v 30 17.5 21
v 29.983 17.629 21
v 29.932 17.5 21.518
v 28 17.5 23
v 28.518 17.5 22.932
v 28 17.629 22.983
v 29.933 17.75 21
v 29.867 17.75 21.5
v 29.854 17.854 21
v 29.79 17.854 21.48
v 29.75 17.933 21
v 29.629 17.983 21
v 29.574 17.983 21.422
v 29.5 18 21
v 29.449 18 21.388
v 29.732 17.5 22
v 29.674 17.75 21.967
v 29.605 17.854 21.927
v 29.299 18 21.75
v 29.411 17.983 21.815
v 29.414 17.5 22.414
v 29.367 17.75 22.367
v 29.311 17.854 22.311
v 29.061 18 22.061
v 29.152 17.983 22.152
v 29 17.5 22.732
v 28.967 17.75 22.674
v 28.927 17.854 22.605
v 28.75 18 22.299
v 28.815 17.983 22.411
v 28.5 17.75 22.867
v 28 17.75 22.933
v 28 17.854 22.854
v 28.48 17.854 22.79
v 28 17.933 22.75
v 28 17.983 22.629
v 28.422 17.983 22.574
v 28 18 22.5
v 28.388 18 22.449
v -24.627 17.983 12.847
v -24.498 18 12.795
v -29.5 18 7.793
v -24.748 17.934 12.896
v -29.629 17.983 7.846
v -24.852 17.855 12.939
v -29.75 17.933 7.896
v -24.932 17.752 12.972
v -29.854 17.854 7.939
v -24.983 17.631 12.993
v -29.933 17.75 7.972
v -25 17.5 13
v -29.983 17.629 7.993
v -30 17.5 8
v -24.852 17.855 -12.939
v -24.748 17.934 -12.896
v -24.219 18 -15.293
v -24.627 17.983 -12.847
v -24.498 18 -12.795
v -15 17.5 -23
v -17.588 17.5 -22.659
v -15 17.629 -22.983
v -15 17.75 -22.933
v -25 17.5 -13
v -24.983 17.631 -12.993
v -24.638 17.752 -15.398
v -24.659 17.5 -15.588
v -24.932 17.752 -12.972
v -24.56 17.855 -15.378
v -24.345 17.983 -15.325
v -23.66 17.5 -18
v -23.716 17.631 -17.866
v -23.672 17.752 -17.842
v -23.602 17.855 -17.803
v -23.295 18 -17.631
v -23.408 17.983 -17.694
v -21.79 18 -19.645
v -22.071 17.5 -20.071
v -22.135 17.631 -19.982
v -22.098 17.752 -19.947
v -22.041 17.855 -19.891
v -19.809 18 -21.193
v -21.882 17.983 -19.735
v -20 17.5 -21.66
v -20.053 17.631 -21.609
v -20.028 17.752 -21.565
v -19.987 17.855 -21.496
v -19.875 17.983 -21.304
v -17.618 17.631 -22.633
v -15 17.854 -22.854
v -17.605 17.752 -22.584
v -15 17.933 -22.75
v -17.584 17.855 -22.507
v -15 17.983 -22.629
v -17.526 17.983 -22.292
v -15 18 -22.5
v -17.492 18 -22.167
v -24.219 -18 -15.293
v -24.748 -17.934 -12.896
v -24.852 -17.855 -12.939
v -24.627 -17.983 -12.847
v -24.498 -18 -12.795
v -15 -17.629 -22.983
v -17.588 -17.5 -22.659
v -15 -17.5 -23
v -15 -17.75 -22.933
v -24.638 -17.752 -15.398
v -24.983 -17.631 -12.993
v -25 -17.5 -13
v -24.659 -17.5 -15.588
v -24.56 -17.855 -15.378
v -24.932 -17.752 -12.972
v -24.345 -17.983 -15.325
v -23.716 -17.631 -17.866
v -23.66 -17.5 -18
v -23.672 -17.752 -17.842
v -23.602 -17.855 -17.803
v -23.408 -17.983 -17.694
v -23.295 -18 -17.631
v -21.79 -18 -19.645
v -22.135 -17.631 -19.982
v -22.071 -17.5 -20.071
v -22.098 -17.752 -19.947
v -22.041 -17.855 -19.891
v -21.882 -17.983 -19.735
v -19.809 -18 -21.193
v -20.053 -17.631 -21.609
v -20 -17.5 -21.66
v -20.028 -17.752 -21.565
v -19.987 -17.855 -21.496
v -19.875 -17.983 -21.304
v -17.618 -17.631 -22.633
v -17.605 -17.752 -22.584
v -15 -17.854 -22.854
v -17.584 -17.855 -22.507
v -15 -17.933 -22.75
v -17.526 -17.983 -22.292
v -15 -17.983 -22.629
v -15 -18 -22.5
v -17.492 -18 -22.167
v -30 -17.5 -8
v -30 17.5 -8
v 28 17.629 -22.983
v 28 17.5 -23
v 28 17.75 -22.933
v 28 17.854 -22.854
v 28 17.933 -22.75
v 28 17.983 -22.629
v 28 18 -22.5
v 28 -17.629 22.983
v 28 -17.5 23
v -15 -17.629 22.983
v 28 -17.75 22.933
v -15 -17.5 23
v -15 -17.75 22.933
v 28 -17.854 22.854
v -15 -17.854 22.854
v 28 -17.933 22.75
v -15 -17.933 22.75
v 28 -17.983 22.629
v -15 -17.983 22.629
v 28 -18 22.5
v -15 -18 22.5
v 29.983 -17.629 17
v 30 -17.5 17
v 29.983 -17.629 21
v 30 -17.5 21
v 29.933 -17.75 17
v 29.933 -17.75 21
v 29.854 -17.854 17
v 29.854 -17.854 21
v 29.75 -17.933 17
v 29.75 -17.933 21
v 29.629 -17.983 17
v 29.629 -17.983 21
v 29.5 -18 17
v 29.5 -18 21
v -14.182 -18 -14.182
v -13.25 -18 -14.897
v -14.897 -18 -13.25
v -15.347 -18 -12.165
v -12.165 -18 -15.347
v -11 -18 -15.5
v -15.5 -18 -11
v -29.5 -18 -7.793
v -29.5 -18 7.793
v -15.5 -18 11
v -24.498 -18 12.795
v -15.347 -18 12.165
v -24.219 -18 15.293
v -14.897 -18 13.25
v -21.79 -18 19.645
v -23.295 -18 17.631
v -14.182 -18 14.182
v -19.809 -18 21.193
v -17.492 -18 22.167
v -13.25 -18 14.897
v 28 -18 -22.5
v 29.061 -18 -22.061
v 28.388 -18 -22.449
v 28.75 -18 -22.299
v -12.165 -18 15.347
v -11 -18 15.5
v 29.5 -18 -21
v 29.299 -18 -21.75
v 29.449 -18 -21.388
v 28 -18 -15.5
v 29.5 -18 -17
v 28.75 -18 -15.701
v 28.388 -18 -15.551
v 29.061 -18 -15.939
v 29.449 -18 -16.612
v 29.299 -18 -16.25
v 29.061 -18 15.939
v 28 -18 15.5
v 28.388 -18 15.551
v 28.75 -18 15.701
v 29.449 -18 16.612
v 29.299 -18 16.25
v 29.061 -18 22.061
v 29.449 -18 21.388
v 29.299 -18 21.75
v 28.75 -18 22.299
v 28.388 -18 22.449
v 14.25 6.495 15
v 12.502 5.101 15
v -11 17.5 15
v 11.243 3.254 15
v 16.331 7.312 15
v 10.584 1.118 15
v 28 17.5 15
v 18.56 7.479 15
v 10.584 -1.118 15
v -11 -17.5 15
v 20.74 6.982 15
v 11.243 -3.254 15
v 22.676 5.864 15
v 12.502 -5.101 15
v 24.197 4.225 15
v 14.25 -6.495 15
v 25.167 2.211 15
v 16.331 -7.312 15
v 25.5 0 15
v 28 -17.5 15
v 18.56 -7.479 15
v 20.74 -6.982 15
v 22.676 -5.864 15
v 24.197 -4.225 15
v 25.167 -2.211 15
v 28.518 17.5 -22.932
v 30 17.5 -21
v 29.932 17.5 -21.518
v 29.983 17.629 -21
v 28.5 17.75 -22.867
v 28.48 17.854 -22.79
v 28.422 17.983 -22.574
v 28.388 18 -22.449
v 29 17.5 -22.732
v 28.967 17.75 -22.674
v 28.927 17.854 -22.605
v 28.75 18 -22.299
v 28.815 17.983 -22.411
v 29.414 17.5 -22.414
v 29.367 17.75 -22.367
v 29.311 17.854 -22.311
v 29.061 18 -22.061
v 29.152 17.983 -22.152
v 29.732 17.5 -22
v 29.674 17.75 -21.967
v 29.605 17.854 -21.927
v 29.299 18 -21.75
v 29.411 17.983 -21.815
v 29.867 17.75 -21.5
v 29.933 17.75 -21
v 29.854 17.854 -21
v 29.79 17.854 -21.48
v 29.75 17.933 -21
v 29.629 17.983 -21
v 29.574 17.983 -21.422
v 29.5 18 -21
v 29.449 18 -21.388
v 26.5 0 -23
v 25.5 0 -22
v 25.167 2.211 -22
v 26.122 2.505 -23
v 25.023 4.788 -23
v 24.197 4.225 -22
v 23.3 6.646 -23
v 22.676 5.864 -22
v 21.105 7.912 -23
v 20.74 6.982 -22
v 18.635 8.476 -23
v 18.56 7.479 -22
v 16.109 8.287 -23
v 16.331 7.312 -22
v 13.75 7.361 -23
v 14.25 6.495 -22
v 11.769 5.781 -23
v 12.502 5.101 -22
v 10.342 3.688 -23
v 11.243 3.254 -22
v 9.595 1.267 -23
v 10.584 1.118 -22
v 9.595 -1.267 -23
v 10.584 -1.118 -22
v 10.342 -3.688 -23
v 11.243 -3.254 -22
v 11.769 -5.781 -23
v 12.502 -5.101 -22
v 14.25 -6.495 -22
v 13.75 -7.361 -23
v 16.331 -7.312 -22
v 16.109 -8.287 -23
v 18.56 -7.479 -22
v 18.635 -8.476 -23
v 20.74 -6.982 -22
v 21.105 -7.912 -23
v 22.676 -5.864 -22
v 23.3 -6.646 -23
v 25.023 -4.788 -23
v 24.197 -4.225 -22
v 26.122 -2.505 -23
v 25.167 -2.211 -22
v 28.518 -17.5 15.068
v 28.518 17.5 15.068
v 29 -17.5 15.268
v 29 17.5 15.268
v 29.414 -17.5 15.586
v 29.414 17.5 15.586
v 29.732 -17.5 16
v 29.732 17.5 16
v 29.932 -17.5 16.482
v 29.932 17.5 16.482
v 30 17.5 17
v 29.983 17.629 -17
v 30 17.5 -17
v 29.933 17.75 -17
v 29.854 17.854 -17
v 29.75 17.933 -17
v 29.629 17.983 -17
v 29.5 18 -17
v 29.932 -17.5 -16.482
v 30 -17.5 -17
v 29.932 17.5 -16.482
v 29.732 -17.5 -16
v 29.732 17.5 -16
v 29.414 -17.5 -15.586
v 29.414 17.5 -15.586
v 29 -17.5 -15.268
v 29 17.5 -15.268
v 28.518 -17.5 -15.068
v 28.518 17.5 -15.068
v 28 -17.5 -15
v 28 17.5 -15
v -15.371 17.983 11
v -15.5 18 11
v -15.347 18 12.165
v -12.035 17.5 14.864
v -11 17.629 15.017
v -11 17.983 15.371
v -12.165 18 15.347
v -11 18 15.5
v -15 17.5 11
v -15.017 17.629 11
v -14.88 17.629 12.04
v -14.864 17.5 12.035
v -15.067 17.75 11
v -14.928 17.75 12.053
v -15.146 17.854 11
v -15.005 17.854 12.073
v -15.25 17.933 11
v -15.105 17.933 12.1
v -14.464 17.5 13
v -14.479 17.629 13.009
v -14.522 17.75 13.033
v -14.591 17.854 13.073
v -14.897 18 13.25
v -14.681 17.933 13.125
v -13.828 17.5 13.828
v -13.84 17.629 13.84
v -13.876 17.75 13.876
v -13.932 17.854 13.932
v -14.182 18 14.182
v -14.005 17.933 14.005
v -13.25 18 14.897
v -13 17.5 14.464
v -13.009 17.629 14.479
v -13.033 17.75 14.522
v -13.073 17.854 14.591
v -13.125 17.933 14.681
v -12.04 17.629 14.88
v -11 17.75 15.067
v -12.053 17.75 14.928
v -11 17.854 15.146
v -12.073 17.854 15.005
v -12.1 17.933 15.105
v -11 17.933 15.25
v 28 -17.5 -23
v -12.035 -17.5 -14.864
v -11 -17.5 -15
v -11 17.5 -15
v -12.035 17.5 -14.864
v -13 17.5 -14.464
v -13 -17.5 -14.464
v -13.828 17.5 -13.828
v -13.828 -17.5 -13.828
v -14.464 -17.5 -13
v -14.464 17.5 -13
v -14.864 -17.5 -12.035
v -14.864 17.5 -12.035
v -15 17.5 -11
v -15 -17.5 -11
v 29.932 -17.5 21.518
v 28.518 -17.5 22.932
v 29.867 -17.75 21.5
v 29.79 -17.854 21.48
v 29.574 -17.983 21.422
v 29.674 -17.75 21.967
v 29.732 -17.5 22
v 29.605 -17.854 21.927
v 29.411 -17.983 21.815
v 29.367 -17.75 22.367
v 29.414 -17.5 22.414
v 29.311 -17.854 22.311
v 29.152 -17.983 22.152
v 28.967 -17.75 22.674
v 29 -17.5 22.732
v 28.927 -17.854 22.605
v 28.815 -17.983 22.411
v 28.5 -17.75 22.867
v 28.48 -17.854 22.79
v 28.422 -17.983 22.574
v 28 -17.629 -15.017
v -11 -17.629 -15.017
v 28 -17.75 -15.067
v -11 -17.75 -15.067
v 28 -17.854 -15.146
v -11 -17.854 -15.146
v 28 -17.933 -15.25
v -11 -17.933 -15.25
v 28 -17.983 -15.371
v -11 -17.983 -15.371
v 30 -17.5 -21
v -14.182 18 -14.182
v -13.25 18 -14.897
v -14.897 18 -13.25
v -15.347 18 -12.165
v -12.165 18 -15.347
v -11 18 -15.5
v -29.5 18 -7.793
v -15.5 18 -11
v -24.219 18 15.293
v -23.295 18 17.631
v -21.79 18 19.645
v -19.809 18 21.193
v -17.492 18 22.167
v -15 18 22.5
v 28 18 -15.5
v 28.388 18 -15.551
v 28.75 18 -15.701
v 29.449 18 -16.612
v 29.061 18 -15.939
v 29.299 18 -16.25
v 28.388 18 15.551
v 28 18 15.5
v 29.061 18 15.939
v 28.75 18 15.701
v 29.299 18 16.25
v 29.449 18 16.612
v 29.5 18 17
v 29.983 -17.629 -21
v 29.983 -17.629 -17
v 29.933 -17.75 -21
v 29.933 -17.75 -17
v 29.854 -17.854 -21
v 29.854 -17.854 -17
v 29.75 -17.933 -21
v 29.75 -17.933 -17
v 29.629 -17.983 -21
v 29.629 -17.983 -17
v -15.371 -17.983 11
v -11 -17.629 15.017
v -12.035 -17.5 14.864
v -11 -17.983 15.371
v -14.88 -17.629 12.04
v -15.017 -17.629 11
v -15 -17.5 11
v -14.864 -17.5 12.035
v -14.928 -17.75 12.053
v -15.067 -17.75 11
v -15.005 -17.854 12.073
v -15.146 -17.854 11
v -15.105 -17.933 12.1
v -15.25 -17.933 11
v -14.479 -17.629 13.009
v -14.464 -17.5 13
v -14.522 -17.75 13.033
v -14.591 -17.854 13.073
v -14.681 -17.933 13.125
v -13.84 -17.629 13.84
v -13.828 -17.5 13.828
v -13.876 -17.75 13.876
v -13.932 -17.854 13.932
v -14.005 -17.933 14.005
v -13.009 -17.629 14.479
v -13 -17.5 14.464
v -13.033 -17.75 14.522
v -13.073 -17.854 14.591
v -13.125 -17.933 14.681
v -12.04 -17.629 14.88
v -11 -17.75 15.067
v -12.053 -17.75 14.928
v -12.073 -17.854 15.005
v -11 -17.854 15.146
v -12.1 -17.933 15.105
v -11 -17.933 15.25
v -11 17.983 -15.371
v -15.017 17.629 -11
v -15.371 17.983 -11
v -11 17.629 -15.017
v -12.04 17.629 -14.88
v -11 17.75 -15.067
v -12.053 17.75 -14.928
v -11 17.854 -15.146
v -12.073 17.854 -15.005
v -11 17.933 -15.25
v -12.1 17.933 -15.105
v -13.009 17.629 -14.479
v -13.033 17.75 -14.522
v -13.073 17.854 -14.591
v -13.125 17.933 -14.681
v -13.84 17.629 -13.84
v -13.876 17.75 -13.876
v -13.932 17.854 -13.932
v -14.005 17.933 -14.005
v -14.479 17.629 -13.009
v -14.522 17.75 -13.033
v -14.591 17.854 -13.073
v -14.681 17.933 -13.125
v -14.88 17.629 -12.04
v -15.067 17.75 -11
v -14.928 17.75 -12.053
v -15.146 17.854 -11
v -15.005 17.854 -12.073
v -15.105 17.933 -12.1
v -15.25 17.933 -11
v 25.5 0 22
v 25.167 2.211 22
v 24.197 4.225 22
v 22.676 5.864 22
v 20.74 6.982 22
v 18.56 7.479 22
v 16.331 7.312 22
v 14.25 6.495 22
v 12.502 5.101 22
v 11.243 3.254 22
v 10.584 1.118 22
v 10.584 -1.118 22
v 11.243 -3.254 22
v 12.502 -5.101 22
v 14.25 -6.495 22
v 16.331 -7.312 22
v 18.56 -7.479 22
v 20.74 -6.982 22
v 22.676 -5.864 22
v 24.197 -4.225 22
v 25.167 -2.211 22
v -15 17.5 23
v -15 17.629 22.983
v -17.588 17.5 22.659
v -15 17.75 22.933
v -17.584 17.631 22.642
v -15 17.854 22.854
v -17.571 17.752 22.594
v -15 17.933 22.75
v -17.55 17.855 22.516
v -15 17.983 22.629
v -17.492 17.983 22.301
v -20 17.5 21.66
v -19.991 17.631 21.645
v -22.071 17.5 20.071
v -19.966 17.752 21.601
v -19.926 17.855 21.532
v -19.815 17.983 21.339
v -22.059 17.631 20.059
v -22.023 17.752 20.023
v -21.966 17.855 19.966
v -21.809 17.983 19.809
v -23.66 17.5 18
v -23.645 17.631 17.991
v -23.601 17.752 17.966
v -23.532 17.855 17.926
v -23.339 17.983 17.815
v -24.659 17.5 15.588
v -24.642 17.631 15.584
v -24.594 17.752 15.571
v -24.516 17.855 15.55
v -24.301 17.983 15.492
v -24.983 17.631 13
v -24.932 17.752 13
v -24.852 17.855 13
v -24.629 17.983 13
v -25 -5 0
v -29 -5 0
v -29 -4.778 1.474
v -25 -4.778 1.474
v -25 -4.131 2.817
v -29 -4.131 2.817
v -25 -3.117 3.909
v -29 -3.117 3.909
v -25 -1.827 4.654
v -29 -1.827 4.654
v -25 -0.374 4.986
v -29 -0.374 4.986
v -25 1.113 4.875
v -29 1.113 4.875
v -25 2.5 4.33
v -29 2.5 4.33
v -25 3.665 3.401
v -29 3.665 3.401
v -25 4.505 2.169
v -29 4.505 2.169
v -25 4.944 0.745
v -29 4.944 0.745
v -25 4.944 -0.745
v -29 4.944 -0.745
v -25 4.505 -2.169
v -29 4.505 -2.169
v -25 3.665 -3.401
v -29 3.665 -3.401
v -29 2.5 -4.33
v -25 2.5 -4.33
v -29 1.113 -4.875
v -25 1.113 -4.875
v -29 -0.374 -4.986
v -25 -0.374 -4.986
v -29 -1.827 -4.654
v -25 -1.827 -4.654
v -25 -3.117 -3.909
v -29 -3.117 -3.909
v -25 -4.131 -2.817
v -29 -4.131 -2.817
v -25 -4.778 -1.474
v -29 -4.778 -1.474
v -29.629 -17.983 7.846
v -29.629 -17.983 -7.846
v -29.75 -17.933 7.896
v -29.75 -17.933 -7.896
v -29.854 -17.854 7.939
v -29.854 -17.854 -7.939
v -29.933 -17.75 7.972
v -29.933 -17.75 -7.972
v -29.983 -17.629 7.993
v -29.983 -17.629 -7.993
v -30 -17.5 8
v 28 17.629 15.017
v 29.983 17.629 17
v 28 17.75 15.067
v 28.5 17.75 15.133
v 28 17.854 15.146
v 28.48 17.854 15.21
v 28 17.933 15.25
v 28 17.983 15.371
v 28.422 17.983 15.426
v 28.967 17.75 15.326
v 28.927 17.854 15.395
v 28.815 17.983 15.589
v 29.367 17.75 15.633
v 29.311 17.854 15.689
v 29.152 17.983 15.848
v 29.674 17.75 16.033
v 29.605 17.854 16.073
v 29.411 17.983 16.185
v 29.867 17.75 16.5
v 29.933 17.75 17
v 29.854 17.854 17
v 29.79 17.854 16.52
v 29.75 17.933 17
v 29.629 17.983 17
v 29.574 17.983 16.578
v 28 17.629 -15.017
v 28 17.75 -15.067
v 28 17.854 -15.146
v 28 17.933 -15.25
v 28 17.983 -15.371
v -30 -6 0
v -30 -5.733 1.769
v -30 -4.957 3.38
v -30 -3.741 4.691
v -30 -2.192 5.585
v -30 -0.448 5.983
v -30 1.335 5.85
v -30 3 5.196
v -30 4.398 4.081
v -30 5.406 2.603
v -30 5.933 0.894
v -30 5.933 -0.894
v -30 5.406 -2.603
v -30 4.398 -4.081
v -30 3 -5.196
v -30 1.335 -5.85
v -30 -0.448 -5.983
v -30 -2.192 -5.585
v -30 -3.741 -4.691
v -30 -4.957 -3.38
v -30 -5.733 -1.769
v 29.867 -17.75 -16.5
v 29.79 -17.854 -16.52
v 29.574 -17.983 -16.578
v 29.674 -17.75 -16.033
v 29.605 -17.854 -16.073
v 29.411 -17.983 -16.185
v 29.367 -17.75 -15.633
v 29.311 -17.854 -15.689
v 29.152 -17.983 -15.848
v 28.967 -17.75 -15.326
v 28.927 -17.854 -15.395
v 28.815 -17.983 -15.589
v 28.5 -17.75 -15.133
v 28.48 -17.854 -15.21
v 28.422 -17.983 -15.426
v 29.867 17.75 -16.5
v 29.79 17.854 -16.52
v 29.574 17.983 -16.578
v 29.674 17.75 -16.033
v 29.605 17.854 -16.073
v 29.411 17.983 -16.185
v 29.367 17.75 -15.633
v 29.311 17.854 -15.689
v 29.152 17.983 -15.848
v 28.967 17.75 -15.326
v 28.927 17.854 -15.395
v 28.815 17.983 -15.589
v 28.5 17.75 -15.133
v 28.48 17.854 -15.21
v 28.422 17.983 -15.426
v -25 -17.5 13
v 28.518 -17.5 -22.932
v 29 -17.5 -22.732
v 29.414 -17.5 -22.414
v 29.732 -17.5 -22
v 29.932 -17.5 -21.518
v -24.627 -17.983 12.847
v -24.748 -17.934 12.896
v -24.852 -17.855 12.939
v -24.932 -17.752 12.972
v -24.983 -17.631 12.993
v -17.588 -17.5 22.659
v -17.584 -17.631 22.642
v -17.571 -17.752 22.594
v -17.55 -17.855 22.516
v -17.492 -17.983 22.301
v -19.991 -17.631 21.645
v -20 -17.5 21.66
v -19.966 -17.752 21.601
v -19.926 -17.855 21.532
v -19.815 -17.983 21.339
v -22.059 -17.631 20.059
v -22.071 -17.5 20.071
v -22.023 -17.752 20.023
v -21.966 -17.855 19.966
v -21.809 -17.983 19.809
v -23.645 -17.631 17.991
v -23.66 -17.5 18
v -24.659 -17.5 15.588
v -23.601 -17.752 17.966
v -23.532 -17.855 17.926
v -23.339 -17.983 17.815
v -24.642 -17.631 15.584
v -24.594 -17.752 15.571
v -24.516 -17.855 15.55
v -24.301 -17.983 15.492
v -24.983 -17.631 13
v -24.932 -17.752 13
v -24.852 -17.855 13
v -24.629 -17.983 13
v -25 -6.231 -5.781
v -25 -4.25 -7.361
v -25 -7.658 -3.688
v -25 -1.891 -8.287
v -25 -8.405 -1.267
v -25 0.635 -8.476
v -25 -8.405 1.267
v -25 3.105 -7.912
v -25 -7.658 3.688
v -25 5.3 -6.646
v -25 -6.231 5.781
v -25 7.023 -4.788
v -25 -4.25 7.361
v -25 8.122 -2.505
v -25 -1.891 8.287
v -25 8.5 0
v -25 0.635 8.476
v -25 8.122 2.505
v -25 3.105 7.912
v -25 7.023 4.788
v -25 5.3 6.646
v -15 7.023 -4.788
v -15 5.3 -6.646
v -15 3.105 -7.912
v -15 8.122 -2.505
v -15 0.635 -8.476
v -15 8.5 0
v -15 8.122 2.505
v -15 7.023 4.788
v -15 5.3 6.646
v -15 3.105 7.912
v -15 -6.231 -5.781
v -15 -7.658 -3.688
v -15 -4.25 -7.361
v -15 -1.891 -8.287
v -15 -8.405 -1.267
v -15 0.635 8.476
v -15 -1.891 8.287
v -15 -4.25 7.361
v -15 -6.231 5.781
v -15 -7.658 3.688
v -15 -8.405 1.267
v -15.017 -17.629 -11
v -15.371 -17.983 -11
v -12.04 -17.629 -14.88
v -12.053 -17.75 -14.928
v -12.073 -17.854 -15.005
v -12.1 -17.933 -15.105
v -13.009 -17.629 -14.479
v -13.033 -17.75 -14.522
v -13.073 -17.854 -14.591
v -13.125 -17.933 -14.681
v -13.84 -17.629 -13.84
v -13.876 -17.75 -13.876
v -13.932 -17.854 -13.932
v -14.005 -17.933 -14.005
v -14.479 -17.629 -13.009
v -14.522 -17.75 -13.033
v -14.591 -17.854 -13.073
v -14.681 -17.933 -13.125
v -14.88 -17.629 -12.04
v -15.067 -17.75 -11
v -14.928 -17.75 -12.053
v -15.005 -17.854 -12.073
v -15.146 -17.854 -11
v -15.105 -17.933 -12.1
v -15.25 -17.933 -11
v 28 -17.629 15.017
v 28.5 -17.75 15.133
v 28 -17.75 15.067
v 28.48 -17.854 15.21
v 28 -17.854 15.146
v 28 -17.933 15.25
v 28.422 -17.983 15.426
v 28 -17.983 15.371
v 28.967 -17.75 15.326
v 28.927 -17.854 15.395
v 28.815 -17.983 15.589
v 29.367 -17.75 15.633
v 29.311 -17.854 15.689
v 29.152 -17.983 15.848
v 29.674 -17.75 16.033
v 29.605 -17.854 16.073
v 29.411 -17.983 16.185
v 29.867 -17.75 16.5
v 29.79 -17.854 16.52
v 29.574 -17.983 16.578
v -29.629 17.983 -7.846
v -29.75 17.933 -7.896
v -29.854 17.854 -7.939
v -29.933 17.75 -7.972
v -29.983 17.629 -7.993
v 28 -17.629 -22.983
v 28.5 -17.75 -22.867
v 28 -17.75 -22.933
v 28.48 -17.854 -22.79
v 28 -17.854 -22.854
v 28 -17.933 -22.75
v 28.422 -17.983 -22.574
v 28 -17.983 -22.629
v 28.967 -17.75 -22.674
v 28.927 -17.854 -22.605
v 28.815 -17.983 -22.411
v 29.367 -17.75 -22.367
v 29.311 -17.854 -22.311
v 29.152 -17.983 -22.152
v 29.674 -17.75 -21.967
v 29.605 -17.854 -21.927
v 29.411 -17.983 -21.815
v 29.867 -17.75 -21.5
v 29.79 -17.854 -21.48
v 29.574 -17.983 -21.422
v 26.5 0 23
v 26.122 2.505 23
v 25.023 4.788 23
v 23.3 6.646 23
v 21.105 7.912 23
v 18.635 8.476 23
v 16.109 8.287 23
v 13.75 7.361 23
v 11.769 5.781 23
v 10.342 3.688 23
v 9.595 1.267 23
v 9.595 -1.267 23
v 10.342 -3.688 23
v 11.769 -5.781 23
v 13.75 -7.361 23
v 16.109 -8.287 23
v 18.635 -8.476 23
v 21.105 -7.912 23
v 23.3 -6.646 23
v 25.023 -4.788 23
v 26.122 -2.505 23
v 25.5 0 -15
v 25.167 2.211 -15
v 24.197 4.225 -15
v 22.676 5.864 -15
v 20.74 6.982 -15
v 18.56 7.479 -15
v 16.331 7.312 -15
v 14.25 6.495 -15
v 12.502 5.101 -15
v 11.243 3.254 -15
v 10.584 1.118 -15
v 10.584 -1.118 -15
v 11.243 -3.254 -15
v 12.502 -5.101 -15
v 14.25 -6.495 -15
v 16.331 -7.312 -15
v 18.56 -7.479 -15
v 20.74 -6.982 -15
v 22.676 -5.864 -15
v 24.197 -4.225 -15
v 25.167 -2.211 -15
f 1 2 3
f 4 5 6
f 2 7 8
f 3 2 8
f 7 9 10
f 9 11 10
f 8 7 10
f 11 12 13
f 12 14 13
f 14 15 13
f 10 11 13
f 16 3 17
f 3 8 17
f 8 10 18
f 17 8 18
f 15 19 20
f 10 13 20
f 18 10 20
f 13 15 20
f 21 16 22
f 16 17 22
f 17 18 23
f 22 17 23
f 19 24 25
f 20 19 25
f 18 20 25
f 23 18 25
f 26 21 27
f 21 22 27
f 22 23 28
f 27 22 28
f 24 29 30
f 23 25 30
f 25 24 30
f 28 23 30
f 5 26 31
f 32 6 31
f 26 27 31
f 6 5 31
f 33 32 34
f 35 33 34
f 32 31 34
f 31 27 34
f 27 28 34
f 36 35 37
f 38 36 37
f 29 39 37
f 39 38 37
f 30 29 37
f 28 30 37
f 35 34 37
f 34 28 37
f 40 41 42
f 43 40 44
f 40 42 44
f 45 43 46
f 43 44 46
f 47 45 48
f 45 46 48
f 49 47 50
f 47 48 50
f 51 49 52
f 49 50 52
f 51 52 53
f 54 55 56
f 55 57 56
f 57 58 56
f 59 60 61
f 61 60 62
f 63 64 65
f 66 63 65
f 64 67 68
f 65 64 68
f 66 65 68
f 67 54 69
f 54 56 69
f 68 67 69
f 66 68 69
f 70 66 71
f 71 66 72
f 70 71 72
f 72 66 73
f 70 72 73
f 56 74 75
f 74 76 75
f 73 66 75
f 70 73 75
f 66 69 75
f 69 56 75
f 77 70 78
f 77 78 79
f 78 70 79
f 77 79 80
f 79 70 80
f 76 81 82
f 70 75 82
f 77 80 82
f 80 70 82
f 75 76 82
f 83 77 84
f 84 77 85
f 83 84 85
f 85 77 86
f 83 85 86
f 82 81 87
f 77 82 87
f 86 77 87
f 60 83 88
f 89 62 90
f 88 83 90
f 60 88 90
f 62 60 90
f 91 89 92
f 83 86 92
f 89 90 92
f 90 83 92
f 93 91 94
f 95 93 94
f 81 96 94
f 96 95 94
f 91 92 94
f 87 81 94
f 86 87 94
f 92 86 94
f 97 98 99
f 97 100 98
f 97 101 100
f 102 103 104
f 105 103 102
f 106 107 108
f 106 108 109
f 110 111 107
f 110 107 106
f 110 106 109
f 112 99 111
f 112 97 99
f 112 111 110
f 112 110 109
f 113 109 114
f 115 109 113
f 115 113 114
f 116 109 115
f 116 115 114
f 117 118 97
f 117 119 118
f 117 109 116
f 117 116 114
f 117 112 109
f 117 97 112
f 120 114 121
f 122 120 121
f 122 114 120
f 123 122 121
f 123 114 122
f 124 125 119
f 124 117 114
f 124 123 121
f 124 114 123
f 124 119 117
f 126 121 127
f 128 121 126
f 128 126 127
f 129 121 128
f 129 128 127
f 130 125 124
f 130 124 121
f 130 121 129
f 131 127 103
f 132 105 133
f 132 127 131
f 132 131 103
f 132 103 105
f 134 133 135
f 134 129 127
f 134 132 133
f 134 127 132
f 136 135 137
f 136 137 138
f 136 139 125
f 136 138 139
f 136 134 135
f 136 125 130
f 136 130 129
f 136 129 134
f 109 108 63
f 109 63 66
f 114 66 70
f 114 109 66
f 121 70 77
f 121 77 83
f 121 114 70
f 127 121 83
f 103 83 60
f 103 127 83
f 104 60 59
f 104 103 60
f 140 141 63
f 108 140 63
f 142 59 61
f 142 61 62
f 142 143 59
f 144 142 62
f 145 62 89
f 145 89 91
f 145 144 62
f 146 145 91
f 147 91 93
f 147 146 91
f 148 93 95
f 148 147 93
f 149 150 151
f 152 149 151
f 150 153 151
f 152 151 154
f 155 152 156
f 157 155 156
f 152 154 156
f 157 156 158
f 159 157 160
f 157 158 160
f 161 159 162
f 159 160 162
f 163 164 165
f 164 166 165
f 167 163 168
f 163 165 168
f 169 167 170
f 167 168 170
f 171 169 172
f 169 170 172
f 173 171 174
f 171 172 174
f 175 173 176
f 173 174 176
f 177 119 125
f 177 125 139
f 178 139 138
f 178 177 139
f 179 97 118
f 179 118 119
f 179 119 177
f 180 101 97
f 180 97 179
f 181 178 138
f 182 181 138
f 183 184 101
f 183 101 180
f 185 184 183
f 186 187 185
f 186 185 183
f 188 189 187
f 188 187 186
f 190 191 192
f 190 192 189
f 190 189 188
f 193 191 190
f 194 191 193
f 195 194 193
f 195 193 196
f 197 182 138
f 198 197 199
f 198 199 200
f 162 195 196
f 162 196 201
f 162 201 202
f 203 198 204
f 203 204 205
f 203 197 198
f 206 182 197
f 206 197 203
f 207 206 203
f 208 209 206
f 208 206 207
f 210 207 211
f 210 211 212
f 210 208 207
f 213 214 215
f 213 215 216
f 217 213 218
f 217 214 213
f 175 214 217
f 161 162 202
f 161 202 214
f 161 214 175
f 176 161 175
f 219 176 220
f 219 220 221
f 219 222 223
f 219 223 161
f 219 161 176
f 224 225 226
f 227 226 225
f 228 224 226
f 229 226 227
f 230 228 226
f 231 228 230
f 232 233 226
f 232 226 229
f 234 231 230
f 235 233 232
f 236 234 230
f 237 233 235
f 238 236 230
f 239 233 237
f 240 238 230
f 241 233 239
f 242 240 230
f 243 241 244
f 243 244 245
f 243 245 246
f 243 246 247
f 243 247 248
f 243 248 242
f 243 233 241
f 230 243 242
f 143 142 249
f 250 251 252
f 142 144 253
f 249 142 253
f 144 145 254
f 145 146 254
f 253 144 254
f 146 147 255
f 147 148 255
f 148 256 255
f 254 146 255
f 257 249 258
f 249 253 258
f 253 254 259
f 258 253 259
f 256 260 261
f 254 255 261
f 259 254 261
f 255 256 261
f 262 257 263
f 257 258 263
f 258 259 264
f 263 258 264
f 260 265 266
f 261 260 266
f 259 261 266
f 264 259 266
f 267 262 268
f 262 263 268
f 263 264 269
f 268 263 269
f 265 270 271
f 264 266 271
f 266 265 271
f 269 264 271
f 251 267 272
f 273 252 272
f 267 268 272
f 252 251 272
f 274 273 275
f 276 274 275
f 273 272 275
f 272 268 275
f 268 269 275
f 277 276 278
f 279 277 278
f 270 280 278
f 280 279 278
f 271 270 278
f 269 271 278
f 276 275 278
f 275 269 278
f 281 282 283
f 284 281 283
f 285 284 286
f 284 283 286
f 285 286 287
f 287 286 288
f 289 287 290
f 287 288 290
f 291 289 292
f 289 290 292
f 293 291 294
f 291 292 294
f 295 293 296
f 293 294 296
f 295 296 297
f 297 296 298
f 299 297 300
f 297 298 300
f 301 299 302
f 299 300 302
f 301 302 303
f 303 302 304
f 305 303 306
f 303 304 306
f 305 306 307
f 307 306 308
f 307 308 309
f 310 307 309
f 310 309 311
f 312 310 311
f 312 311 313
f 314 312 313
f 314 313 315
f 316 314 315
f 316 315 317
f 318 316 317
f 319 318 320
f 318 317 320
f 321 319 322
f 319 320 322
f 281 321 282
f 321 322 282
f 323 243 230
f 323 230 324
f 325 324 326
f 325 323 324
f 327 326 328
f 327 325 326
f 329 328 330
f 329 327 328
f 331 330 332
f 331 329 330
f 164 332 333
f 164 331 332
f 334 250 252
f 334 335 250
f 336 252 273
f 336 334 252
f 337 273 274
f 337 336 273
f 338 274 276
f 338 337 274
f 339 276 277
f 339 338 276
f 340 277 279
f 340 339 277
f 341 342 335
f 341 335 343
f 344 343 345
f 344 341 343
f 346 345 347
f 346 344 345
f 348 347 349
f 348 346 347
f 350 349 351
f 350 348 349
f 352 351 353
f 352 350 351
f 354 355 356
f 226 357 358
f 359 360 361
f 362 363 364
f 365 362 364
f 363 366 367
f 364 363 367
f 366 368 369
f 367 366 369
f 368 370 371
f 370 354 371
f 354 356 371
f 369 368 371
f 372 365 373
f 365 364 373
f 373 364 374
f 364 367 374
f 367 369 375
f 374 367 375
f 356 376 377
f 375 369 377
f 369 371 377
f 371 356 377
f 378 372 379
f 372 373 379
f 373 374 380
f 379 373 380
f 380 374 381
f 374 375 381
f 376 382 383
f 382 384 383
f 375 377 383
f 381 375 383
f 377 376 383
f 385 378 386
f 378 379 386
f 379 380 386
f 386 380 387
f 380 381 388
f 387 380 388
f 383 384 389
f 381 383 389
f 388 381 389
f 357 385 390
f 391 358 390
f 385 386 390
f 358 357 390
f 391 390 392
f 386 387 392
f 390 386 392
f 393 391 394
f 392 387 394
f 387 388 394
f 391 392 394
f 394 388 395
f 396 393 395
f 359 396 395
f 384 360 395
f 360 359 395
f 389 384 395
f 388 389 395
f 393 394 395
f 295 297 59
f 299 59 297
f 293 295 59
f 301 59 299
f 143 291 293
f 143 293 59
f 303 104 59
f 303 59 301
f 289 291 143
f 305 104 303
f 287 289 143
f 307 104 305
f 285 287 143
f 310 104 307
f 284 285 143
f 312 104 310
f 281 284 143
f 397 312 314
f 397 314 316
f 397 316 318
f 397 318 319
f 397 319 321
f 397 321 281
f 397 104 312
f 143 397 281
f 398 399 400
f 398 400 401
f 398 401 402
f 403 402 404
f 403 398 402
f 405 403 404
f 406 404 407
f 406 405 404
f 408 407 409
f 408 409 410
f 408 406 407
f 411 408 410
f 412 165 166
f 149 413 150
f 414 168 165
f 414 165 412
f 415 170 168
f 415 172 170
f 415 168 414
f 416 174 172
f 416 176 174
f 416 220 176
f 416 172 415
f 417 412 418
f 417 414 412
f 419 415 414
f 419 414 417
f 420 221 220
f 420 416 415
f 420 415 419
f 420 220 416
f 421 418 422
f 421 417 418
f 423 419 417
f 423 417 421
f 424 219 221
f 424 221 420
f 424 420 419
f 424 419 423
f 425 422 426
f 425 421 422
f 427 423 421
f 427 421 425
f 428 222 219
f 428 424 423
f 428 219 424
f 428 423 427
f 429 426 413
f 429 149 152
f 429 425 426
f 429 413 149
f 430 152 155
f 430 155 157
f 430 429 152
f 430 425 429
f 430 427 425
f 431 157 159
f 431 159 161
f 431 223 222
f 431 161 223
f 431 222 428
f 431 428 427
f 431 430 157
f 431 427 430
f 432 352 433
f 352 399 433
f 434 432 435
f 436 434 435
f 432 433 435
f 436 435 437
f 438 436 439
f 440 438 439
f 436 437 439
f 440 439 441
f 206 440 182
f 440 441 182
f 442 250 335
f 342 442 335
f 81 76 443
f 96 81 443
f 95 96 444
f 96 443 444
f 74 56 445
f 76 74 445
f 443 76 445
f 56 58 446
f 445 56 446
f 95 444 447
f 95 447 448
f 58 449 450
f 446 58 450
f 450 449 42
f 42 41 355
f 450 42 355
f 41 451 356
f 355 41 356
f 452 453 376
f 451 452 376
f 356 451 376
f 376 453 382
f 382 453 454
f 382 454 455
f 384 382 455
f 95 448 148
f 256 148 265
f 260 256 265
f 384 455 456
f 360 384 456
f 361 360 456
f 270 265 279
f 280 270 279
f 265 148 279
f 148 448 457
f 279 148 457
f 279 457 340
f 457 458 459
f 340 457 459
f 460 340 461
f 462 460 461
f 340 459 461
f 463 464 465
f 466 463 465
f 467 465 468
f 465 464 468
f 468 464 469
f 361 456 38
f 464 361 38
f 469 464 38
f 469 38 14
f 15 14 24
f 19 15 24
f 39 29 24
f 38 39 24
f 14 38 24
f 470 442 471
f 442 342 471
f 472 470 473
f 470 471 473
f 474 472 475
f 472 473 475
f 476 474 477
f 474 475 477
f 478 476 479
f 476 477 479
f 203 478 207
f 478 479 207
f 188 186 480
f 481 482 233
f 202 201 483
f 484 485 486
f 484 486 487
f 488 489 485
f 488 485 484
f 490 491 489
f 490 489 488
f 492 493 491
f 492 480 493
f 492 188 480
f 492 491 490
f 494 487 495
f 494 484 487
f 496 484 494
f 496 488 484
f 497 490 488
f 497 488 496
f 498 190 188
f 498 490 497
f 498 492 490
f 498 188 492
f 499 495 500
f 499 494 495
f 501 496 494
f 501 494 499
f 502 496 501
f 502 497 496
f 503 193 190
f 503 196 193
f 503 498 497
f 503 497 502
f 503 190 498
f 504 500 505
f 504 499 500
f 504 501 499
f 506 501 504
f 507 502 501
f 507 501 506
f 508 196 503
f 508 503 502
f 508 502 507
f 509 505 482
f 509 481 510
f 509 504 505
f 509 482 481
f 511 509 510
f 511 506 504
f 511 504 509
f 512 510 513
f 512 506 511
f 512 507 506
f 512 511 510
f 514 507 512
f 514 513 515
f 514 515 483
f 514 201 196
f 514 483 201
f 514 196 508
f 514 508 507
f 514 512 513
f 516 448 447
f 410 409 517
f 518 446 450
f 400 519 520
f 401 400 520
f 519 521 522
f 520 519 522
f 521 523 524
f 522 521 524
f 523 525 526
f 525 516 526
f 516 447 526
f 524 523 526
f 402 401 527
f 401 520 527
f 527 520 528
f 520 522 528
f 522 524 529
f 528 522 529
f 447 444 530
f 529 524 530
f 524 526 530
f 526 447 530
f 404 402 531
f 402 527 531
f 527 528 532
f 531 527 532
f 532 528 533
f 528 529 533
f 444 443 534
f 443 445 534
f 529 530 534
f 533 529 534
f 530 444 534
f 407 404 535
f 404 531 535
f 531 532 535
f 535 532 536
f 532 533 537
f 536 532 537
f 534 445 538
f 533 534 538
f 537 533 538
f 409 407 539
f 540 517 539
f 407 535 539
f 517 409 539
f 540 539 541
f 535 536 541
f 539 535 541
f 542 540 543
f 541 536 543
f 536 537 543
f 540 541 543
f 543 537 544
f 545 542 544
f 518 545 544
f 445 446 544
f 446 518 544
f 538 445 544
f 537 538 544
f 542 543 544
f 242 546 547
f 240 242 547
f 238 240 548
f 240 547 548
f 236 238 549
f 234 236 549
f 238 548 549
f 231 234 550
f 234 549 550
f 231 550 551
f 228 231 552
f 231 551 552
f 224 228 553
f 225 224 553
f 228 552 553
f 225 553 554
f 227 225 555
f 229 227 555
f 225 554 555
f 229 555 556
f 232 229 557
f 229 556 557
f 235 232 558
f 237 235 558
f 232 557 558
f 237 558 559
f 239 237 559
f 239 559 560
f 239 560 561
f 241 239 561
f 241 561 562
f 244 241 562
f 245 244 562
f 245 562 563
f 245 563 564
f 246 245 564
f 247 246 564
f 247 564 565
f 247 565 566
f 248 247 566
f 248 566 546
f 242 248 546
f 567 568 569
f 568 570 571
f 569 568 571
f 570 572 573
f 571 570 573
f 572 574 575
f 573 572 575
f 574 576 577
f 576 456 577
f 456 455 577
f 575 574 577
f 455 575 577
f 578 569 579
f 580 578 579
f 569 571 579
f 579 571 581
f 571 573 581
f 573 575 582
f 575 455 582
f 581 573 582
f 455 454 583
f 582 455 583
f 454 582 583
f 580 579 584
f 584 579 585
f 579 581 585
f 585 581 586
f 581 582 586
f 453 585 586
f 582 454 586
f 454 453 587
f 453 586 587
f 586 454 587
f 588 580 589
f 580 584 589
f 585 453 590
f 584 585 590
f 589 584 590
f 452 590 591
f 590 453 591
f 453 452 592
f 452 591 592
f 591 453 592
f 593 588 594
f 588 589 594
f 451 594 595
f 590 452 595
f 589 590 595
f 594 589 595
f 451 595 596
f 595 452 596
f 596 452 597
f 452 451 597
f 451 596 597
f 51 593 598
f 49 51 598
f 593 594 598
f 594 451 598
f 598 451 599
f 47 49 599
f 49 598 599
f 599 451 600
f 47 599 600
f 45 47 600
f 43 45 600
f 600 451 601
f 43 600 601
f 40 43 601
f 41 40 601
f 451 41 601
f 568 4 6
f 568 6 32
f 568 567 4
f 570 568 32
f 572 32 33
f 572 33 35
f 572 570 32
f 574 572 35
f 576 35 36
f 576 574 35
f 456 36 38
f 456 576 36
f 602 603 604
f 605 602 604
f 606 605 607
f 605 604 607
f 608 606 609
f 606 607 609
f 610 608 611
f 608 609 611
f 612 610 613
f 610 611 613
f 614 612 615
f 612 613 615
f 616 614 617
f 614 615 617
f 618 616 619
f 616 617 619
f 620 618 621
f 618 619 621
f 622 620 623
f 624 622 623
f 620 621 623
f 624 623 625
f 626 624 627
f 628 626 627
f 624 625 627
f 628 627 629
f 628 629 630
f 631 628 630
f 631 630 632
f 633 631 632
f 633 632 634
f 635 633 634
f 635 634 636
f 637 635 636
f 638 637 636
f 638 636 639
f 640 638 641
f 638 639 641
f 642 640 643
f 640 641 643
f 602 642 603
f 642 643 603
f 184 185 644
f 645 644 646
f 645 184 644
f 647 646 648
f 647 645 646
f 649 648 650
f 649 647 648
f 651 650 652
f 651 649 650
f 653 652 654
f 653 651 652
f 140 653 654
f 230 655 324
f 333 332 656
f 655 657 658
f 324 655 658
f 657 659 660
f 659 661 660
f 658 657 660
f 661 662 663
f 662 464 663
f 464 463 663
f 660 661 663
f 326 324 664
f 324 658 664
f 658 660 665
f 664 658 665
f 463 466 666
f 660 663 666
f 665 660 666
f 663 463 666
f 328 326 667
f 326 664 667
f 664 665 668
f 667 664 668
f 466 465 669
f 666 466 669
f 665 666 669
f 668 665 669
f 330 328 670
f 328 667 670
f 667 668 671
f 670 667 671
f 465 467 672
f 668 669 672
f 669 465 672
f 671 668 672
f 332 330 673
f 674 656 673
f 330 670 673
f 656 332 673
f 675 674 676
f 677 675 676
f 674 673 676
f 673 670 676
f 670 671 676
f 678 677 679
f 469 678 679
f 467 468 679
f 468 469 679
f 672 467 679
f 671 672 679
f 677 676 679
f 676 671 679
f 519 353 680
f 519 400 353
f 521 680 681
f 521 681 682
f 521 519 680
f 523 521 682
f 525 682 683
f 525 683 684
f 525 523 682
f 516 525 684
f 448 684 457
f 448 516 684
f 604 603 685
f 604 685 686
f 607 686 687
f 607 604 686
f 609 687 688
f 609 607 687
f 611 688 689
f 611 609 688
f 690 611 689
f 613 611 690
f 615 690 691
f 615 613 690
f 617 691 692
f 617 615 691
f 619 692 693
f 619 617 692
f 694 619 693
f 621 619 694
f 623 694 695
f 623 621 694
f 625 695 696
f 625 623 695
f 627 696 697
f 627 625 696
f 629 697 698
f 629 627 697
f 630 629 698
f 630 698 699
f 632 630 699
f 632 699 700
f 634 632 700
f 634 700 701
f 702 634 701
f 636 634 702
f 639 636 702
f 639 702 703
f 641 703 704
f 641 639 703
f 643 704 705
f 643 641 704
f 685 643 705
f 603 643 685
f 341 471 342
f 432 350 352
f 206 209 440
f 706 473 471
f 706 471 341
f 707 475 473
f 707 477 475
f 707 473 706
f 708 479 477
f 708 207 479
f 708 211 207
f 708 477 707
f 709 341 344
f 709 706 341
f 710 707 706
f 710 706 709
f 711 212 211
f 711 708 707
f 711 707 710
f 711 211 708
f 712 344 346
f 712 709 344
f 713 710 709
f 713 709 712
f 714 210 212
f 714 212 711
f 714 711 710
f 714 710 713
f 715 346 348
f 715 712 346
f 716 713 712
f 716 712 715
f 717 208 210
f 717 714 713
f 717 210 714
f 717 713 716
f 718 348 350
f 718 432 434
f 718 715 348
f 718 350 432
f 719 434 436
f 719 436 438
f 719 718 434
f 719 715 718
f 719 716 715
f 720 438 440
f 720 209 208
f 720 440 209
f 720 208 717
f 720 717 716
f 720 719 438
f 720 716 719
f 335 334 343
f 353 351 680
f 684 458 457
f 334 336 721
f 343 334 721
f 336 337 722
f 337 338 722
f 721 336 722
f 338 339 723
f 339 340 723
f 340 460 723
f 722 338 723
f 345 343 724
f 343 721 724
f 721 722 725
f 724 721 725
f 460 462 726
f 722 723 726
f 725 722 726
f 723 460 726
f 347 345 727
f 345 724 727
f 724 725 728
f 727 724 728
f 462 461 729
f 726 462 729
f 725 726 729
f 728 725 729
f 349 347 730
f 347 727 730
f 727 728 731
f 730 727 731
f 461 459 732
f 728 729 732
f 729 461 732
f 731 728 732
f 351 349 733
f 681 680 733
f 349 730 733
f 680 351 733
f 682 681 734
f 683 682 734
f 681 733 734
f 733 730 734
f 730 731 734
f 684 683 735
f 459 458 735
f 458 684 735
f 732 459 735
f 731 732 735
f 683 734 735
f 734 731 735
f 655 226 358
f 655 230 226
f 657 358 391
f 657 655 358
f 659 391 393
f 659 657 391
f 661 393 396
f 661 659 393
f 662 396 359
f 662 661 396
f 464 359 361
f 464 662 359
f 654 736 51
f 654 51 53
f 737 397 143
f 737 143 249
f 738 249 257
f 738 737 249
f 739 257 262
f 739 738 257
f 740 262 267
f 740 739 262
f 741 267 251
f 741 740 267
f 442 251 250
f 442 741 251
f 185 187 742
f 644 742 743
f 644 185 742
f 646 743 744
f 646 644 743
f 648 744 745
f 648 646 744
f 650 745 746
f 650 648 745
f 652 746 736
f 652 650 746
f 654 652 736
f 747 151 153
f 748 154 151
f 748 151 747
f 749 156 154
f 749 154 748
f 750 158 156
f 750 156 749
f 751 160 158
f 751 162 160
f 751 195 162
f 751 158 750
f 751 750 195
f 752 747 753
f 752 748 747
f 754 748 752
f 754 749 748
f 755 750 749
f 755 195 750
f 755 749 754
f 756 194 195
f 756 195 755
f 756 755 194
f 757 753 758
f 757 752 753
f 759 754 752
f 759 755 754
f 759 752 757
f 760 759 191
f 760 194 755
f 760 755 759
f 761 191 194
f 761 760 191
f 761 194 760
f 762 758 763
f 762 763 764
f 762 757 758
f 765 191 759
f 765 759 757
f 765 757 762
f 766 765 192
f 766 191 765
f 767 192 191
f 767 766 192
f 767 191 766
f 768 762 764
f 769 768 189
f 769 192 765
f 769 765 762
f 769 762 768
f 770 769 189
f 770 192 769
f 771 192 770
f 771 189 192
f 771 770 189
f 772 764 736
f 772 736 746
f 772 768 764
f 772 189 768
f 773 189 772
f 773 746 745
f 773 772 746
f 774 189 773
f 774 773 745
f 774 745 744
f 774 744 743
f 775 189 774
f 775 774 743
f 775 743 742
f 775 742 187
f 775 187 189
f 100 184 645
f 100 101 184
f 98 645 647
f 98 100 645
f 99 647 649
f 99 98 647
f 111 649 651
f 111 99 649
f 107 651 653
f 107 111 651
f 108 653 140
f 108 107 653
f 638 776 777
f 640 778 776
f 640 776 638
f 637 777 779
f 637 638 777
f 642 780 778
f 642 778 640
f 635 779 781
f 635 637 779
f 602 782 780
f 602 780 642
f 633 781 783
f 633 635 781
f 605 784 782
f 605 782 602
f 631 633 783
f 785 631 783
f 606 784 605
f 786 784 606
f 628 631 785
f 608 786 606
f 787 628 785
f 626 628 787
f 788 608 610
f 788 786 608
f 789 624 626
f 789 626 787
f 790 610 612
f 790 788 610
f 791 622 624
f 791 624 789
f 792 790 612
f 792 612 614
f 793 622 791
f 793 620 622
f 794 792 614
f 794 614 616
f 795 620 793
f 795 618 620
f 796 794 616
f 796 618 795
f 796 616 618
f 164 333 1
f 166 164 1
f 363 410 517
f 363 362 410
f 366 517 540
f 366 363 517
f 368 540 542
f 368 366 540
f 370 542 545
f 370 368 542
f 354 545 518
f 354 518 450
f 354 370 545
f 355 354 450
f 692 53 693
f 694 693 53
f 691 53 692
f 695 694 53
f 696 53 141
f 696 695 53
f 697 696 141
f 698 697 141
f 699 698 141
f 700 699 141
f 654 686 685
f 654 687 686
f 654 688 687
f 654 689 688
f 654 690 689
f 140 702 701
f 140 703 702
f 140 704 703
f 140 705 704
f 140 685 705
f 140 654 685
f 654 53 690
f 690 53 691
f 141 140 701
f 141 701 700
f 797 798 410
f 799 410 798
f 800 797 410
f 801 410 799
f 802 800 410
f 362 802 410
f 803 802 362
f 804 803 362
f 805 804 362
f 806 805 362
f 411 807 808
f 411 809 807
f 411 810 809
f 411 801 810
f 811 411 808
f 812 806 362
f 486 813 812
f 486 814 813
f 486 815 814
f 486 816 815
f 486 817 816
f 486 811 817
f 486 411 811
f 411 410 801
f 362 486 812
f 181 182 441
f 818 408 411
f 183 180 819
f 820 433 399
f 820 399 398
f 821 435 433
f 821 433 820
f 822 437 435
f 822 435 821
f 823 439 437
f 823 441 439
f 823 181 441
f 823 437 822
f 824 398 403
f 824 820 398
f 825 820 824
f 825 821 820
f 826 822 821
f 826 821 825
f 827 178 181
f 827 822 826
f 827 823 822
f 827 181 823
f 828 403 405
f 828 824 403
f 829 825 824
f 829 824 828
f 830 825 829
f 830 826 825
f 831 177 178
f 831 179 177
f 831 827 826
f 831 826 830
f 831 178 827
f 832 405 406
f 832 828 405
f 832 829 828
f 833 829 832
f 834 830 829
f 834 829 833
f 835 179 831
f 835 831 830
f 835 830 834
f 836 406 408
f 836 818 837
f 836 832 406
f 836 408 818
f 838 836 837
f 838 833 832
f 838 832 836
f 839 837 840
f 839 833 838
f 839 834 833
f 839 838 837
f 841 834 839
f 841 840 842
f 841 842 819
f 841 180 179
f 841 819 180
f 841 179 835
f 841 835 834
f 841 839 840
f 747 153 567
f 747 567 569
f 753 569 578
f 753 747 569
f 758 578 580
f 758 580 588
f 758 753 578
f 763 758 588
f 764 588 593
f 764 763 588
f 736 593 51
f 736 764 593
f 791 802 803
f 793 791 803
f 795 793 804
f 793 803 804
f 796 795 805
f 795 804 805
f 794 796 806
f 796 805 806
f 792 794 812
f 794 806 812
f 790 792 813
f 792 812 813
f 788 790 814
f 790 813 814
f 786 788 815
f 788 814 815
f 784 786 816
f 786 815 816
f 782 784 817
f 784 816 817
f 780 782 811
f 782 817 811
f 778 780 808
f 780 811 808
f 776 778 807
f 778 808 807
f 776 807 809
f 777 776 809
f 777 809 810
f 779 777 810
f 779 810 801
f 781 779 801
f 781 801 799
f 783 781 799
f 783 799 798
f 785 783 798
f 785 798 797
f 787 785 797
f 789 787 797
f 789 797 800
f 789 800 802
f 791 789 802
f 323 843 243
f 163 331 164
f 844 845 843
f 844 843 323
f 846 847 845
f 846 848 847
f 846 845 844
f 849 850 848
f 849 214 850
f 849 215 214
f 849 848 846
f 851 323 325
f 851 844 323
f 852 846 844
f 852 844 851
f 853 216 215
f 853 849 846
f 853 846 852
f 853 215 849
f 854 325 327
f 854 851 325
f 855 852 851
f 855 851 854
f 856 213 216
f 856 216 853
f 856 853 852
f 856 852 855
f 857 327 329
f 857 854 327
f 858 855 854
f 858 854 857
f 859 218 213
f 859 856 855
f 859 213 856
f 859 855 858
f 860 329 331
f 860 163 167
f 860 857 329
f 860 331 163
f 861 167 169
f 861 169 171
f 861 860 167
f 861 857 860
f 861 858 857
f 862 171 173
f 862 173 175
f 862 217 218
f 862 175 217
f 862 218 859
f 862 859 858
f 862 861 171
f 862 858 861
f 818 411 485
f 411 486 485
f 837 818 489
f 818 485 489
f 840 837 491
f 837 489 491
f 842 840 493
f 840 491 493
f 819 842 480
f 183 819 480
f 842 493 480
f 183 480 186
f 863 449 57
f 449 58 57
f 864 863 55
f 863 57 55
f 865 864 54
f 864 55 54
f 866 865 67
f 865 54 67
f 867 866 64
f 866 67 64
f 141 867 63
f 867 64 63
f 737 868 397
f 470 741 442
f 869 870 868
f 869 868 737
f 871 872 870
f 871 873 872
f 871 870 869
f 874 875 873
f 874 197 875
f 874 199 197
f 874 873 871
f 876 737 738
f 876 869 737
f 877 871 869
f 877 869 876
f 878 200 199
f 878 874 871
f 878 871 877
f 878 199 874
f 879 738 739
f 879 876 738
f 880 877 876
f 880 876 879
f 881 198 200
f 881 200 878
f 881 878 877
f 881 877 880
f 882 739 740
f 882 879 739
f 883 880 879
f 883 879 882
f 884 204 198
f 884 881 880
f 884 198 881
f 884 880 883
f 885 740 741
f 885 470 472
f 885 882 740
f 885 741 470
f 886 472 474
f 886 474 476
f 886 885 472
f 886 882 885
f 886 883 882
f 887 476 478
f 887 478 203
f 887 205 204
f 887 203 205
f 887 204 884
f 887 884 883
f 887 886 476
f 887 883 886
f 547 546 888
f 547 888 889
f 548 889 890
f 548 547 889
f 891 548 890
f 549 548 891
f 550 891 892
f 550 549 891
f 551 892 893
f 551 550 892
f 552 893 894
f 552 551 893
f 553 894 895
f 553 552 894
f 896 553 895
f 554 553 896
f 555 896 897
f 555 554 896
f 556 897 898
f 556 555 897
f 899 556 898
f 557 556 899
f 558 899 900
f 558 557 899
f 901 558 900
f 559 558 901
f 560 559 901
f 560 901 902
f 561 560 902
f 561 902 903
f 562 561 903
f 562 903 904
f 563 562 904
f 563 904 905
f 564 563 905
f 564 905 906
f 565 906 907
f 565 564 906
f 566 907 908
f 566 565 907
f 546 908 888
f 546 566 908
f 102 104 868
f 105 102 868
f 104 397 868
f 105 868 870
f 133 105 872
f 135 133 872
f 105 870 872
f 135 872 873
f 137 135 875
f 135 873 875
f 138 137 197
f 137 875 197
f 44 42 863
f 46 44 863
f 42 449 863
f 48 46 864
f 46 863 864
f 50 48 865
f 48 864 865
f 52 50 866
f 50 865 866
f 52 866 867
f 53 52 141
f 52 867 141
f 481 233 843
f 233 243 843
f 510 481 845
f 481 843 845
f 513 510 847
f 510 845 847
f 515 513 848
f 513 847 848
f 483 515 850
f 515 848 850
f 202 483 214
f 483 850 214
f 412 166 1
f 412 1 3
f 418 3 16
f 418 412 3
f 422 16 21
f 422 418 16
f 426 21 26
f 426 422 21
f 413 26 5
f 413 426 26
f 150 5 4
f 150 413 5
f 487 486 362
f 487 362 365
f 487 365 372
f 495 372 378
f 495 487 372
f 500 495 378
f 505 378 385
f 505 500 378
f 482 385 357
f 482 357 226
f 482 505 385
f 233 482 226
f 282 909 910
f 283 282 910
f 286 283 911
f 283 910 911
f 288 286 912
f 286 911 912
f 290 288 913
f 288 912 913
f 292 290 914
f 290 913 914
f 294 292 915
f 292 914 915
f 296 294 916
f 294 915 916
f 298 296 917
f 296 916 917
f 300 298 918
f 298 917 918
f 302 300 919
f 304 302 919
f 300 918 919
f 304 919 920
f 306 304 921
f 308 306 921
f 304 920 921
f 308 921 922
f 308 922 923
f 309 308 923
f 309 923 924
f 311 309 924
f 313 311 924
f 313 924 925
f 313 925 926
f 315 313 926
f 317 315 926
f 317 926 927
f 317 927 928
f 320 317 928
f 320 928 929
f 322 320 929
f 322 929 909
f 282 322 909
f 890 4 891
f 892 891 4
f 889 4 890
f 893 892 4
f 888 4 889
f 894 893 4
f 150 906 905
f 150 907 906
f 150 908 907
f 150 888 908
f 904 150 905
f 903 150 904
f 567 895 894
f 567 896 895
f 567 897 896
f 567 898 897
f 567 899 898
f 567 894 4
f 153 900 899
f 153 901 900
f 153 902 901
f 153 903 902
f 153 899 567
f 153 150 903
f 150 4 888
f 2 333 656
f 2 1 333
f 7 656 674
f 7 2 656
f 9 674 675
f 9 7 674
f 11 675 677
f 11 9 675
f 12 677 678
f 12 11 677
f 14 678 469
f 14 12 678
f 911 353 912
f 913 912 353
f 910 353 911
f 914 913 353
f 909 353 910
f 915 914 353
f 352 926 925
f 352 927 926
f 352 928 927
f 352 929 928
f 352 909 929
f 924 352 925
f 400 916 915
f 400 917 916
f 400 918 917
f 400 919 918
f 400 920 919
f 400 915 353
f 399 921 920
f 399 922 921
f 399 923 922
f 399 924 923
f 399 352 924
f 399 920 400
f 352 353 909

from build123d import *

# Parameters (mm, degrees)
F1_DEPTH       = 18
F2_R           = 7.5
F3_DEPTH       = 46.001
F5_D           = 10
F5_CBORE_D     = 17
F5_CBORE_DEPTH = 10
F6_SIZE2       = 1
F6_SIZE        = 1
F7_R           = 0.5


with BuildPart() as f1:
    # F0 (on Front) → F1 (new body, symmetric)
    with BuildSketch(Plane.XZ):
        with BuildLine():
            ThreePointArc((30, 21), (29.4142135624, 22.4142135624), (28, 23))
            Line((28, 23), (-15, 23))
            ThreePointArc((-15, 23), (-22.0710678119, 20.0710678119), (-25, 13))
            Line((-25, 13), (-30, 8))
            Line((-30, 8), (-30, -8))
            Line((-30, -8), (-25, -13))
            ThreePointArc((-25, -13), (-22.0710678119, -20.0710678119), (-15, -23))
            Line((-15, -23), (28, -23))
            ThreePointArc((28, -23), (29.4142135624, -22.4142135624), (30, -21))
            Line((30, -21), (30, -17))
            ThreePointArc((30, -17), (29.4142135624, -15.5857864376), (28, -15))
            Line((28, -15), (-11, -15))
            ThreePointArc((-11, -15), (-13.8284271247, -13.8284271247), (-15, -11))
            Line((-15, -11), (-15, 11))
            ThreePointArc((-15, 11), (-13.8284271247, 13.8284271247), (-11, 15))
            Line((-11, 15), (28, 15))
            ThreePointArc((28, 15), (29.4142135624, 15.5857864376), (30, 17))
            Line((30, 17), (30, 21))
        make_face()
    extrude(amount=F1_DEPTH, both=True)

    # F2 (on face) → F3 (cut, through all)
    with BuildSketch(Plane.XY.offset(23)):
        with Locations((18, 0)):
            Circle(F2_R)
    extrude(amount=-F3_DEPTH, mode=Mode.SUBTRACT)

    # F5 (through all)
    with Locations(Plane.YZ.offset(-15)):
        with Locations((0, 0)):
            CounterBoreHole(F5_D / 2, F5_CBORE_D / 2, F5_CBORE_DEPTH)

    # F6
    f6_edges = [f1.edges().sort_by_distance(p)[0] for p in [
        (10.5, 0, -23),
        (10.5, 0, 23),
        (-30, -5, 0),
    ]]
    chamfer(f6_edges, length=F6_SIZE, length2=F6_SIZE2)

    # F7
    f7_edges = [f1.edges().sort_by_distance(p)[0] for p in [
        (29.414214, 18, 22.414214),
        (6.5, 18, 23),
        (-22.071068, 18, 20.071068),
        (-27.5, 18, 10.5),
        (-30, 18, 0),
        (-27.5, 18, -10.5),
        (-22.071068, 18, -20.071068),
        (6.5, 18, -23),
        (29.414214, 18, -22.414214),
        (30, 18, -19),
        (29.414214, 18, -15.585786),
        (8.5, 18, -15),
        (-13.828427, 18, -13.828427),
        (-15, 18, 0),
        (-13.828427, 18, 13.828427),
        (8.5, 18, 15),
        (29.414214, 18, 15.585786),
        (30, 18, 19),
        (29.414214, -18, 22.414214),
        (6.5, -18, 23),
        (-22.071068, -18, 20.071068),
        (-27.5, -18, 10.5),
        (-30, -18, 0),
        (-27.5, -18, -10.5),
        (-22.071068, -18, -20.071068),
        (6.5, -18, -23),
        (29.414214, -18, -22.414214),
        (30, -18, -19),
        (29.414214, -18, -15.585786),
        (8.5, -18, -15),
        (-13.828427, -18, -13.828427),
        (-15, -18, 0),
        (-13.828427, -18, 13.828427),
        (8.5, -18, 15),
        (29.414214, -18, 15.585786),
        (30, -18, 19),
    ]]
    fillet(f7_edges, radius=F7_R)


solid = f1.part
